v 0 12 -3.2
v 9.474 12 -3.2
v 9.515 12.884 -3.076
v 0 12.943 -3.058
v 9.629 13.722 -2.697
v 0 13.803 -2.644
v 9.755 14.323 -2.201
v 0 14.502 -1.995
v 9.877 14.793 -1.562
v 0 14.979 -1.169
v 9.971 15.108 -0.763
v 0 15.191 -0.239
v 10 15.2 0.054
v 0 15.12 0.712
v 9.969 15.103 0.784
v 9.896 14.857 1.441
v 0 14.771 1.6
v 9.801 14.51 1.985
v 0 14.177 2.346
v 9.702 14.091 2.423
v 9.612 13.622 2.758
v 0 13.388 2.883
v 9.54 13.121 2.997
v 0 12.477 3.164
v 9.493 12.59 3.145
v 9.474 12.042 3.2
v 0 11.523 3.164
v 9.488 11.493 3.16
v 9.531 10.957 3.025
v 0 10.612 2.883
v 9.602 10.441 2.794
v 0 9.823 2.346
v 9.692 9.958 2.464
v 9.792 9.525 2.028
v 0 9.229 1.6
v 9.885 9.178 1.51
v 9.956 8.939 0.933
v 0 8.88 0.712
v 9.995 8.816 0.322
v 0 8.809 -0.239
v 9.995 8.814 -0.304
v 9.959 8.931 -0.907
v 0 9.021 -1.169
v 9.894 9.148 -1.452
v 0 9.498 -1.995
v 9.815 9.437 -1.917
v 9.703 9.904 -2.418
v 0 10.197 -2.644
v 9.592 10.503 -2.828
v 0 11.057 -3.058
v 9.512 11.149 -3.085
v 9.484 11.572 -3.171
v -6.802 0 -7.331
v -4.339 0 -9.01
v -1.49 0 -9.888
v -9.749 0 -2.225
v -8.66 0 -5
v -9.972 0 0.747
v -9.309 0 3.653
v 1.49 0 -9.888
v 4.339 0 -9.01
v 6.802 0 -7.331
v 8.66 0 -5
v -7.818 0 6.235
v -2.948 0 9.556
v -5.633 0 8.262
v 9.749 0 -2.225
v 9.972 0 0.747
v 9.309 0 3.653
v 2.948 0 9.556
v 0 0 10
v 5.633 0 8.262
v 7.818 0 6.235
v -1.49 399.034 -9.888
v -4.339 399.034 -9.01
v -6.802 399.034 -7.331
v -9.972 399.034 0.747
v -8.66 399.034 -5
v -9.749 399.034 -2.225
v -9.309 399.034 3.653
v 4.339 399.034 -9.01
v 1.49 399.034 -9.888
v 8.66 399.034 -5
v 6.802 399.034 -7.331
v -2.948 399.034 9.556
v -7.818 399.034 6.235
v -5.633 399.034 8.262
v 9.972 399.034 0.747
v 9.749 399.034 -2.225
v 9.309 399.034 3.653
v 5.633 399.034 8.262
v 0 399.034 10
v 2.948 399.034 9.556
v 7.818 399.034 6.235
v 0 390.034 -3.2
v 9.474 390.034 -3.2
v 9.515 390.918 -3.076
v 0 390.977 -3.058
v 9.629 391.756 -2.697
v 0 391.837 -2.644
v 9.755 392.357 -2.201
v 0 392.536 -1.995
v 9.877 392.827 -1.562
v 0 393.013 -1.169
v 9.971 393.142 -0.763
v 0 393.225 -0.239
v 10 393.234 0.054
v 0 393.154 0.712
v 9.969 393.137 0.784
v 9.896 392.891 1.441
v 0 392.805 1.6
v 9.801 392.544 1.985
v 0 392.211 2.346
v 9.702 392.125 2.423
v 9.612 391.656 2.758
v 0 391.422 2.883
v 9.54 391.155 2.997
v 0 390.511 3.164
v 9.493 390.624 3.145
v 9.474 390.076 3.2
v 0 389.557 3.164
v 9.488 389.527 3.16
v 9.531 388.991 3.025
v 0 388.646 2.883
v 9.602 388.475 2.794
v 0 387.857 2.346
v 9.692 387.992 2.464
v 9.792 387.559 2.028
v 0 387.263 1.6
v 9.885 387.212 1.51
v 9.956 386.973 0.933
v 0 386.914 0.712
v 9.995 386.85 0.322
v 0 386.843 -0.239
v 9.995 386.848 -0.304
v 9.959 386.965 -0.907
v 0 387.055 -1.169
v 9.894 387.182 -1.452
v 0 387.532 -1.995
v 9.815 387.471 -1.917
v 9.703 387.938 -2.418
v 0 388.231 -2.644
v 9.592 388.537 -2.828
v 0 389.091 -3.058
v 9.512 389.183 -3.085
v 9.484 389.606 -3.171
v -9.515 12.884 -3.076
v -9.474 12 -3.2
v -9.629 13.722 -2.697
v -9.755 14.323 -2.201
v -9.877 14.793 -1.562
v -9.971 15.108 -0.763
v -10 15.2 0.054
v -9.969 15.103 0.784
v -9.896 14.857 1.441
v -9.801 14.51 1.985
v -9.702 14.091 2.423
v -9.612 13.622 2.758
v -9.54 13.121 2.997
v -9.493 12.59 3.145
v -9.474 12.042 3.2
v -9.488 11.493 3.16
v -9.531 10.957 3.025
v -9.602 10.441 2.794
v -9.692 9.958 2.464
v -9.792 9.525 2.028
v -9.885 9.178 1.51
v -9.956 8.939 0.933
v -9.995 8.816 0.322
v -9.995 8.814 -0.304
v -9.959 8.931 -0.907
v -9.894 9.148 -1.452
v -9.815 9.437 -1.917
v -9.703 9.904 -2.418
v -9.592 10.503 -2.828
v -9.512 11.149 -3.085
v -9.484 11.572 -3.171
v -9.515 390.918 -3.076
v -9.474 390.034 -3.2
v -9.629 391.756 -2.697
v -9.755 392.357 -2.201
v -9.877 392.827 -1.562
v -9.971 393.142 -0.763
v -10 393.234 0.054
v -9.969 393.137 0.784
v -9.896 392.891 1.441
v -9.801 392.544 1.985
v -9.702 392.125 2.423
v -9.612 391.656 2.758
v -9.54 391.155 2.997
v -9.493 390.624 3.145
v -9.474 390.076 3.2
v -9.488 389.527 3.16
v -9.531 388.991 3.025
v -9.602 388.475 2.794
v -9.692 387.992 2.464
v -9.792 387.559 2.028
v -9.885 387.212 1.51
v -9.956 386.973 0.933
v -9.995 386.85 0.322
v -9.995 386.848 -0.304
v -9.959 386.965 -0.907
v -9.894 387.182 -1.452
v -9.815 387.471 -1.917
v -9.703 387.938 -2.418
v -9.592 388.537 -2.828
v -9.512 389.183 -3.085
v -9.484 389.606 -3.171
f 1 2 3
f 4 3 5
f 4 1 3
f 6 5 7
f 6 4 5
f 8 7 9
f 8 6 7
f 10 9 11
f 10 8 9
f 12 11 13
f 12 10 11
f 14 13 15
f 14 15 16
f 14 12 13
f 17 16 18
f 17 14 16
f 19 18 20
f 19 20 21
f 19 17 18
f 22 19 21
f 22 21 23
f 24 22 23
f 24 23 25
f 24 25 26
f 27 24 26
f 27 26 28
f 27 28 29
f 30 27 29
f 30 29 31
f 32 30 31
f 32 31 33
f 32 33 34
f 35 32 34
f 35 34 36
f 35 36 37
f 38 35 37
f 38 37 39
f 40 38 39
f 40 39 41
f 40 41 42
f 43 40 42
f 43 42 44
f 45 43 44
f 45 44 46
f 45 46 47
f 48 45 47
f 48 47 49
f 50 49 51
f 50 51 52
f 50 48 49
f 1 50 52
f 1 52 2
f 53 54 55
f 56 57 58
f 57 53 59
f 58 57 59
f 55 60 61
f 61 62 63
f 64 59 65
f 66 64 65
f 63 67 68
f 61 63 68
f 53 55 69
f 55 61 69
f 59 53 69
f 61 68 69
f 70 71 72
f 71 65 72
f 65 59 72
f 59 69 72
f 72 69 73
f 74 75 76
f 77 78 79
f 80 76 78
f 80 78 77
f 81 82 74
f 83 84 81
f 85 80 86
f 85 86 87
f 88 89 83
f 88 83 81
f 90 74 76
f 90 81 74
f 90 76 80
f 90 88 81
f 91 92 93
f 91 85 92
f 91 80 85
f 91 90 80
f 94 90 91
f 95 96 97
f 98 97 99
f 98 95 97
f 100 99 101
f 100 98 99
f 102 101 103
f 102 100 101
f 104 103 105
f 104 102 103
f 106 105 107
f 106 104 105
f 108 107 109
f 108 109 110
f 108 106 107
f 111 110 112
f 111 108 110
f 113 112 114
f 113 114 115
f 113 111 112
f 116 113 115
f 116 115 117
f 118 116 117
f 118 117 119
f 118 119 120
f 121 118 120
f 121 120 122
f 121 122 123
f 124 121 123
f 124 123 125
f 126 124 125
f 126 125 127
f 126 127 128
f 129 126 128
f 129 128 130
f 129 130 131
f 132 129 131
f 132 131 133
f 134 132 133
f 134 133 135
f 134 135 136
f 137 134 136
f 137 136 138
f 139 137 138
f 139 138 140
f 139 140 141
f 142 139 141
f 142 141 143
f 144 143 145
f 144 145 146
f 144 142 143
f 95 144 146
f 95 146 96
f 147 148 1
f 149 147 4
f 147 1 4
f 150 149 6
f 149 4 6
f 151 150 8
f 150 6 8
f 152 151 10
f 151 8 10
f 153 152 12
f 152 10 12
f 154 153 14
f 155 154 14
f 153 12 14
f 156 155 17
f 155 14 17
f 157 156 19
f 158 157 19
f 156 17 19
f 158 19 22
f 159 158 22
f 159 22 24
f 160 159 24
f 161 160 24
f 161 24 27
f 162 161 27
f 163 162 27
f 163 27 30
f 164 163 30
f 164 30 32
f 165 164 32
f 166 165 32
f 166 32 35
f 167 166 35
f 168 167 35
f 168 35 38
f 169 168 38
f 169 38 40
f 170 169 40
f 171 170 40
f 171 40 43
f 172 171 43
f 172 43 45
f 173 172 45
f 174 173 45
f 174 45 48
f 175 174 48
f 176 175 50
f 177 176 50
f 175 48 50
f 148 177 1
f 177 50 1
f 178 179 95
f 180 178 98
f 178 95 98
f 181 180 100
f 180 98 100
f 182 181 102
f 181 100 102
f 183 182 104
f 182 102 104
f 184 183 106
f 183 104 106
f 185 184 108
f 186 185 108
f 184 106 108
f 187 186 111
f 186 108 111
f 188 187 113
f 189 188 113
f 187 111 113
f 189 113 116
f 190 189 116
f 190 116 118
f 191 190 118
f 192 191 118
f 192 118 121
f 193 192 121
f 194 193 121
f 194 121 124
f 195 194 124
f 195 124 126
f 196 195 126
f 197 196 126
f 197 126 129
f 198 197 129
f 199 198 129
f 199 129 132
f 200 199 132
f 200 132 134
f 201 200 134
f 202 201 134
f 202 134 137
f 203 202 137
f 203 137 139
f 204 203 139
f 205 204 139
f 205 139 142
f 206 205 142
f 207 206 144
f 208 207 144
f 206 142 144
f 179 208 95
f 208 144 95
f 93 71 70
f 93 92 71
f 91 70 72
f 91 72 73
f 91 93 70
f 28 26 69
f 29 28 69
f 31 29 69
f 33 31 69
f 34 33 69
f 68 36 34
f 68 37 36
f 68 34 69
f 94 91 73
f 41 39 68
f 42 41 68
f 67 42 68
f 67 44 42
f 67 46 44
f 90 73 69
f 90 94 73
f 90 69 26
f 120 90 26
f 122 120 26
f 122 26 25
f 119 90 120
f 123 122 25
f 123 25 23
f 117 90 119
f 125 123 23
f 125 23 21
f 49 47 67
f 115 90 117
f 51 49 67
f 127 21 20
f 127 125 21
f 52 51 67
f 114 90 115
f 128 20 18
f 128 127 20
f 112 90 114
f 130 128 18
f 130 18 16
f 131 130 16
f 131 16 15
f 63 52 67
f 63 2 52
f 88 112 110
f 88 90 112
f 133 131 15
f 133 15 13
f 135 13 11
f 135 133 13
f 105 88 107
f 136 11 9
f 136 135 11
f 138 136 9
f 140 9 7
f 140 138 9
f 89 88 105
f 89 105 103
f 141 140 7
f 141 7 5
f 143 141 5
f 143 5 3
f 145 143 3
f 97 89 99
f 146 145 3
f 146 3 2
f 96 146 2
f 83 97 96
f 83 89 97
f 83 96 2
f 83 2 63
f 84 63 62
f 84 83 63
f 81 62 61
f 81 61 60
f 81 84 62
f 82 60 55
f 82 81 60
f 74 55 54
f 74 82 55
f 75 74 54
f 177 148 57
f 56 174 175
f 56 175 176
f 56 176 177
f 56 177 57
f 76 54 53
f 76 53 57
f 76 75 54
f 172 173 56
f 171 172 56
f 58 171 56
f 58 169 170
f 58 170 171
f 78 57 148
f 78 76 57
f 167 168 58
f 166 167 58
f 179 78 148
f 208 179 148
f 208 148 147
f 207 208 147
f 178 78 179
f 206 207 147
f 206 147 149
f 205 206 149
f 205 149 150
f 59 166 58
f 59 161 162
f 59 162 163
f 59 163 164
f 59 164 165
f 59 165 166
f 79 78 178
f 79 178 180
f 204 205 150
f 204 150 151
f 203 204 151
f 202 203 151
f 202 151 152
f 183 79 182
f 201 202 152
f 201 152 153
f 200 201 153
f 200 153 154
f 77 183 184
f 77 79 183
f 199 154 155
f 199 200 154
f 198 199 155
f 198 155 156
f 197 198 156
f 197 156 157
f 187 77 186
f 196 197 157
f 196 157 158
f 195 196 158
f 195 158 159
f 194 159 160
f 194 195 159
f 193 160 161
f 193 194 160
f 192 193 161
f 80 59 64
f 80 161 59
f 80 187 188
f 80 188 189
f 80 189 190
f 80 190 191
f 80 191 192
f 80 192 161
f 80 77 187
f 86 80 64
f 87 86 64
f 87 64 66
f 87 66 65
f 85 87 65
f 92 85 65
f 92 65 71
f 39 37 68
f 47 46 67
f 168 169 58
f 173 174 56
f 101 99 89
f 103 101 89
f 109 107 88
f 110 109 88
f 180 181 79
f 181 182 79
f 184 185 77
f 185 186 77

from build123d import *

# Parameters (mm, degrees)
SKETCH1_W               = 10
SKETCH1_H               = 399.034
SKETCH2_R               = 3.2
CUT_EXTRUDE1_DEPTH      = 11
CUT_EXTRUDE1_DEPTH_BACK = 11


with BuildPart() as part:
    # Sketch1 → Revolve2 (revolve)
    with BuildSketch(Plane(origin=(0, 0, 0), x_dir=(0, 0, -1), z_dir=(1, 0, 0))):
        with Locations((-5, 199.517)):
            Rectangle(SKETCH1_W, SKETCH1_H)
    revolve(axis=Axis((0, 0, 0), (0, 1, 0)))

    # Sketch2 → Cut-Extrude1 (cut, two sides)
    with BuildSketch(Plane(origin=(0, 0, 0), x_dir=(0, 0, -1), z_dir=(1, 0, 0))) as cut_extrude1_sk:
        with Locations((0, 390.034)):
            Circle(SKETCH2_R)
        with Locations((0, 12)):
            Circle(SKETCH2_R)
    extrude(amount=CUT_EXTRUDE1_DEPTH, mode=Mode.SUBTRACT)
    extrude(cut_extrude1_sk.sketch, amount=-CUT_EXTRUDE1_DEPTH_BACK, mode=Mode.SUBTRACT)


solid = part.part
